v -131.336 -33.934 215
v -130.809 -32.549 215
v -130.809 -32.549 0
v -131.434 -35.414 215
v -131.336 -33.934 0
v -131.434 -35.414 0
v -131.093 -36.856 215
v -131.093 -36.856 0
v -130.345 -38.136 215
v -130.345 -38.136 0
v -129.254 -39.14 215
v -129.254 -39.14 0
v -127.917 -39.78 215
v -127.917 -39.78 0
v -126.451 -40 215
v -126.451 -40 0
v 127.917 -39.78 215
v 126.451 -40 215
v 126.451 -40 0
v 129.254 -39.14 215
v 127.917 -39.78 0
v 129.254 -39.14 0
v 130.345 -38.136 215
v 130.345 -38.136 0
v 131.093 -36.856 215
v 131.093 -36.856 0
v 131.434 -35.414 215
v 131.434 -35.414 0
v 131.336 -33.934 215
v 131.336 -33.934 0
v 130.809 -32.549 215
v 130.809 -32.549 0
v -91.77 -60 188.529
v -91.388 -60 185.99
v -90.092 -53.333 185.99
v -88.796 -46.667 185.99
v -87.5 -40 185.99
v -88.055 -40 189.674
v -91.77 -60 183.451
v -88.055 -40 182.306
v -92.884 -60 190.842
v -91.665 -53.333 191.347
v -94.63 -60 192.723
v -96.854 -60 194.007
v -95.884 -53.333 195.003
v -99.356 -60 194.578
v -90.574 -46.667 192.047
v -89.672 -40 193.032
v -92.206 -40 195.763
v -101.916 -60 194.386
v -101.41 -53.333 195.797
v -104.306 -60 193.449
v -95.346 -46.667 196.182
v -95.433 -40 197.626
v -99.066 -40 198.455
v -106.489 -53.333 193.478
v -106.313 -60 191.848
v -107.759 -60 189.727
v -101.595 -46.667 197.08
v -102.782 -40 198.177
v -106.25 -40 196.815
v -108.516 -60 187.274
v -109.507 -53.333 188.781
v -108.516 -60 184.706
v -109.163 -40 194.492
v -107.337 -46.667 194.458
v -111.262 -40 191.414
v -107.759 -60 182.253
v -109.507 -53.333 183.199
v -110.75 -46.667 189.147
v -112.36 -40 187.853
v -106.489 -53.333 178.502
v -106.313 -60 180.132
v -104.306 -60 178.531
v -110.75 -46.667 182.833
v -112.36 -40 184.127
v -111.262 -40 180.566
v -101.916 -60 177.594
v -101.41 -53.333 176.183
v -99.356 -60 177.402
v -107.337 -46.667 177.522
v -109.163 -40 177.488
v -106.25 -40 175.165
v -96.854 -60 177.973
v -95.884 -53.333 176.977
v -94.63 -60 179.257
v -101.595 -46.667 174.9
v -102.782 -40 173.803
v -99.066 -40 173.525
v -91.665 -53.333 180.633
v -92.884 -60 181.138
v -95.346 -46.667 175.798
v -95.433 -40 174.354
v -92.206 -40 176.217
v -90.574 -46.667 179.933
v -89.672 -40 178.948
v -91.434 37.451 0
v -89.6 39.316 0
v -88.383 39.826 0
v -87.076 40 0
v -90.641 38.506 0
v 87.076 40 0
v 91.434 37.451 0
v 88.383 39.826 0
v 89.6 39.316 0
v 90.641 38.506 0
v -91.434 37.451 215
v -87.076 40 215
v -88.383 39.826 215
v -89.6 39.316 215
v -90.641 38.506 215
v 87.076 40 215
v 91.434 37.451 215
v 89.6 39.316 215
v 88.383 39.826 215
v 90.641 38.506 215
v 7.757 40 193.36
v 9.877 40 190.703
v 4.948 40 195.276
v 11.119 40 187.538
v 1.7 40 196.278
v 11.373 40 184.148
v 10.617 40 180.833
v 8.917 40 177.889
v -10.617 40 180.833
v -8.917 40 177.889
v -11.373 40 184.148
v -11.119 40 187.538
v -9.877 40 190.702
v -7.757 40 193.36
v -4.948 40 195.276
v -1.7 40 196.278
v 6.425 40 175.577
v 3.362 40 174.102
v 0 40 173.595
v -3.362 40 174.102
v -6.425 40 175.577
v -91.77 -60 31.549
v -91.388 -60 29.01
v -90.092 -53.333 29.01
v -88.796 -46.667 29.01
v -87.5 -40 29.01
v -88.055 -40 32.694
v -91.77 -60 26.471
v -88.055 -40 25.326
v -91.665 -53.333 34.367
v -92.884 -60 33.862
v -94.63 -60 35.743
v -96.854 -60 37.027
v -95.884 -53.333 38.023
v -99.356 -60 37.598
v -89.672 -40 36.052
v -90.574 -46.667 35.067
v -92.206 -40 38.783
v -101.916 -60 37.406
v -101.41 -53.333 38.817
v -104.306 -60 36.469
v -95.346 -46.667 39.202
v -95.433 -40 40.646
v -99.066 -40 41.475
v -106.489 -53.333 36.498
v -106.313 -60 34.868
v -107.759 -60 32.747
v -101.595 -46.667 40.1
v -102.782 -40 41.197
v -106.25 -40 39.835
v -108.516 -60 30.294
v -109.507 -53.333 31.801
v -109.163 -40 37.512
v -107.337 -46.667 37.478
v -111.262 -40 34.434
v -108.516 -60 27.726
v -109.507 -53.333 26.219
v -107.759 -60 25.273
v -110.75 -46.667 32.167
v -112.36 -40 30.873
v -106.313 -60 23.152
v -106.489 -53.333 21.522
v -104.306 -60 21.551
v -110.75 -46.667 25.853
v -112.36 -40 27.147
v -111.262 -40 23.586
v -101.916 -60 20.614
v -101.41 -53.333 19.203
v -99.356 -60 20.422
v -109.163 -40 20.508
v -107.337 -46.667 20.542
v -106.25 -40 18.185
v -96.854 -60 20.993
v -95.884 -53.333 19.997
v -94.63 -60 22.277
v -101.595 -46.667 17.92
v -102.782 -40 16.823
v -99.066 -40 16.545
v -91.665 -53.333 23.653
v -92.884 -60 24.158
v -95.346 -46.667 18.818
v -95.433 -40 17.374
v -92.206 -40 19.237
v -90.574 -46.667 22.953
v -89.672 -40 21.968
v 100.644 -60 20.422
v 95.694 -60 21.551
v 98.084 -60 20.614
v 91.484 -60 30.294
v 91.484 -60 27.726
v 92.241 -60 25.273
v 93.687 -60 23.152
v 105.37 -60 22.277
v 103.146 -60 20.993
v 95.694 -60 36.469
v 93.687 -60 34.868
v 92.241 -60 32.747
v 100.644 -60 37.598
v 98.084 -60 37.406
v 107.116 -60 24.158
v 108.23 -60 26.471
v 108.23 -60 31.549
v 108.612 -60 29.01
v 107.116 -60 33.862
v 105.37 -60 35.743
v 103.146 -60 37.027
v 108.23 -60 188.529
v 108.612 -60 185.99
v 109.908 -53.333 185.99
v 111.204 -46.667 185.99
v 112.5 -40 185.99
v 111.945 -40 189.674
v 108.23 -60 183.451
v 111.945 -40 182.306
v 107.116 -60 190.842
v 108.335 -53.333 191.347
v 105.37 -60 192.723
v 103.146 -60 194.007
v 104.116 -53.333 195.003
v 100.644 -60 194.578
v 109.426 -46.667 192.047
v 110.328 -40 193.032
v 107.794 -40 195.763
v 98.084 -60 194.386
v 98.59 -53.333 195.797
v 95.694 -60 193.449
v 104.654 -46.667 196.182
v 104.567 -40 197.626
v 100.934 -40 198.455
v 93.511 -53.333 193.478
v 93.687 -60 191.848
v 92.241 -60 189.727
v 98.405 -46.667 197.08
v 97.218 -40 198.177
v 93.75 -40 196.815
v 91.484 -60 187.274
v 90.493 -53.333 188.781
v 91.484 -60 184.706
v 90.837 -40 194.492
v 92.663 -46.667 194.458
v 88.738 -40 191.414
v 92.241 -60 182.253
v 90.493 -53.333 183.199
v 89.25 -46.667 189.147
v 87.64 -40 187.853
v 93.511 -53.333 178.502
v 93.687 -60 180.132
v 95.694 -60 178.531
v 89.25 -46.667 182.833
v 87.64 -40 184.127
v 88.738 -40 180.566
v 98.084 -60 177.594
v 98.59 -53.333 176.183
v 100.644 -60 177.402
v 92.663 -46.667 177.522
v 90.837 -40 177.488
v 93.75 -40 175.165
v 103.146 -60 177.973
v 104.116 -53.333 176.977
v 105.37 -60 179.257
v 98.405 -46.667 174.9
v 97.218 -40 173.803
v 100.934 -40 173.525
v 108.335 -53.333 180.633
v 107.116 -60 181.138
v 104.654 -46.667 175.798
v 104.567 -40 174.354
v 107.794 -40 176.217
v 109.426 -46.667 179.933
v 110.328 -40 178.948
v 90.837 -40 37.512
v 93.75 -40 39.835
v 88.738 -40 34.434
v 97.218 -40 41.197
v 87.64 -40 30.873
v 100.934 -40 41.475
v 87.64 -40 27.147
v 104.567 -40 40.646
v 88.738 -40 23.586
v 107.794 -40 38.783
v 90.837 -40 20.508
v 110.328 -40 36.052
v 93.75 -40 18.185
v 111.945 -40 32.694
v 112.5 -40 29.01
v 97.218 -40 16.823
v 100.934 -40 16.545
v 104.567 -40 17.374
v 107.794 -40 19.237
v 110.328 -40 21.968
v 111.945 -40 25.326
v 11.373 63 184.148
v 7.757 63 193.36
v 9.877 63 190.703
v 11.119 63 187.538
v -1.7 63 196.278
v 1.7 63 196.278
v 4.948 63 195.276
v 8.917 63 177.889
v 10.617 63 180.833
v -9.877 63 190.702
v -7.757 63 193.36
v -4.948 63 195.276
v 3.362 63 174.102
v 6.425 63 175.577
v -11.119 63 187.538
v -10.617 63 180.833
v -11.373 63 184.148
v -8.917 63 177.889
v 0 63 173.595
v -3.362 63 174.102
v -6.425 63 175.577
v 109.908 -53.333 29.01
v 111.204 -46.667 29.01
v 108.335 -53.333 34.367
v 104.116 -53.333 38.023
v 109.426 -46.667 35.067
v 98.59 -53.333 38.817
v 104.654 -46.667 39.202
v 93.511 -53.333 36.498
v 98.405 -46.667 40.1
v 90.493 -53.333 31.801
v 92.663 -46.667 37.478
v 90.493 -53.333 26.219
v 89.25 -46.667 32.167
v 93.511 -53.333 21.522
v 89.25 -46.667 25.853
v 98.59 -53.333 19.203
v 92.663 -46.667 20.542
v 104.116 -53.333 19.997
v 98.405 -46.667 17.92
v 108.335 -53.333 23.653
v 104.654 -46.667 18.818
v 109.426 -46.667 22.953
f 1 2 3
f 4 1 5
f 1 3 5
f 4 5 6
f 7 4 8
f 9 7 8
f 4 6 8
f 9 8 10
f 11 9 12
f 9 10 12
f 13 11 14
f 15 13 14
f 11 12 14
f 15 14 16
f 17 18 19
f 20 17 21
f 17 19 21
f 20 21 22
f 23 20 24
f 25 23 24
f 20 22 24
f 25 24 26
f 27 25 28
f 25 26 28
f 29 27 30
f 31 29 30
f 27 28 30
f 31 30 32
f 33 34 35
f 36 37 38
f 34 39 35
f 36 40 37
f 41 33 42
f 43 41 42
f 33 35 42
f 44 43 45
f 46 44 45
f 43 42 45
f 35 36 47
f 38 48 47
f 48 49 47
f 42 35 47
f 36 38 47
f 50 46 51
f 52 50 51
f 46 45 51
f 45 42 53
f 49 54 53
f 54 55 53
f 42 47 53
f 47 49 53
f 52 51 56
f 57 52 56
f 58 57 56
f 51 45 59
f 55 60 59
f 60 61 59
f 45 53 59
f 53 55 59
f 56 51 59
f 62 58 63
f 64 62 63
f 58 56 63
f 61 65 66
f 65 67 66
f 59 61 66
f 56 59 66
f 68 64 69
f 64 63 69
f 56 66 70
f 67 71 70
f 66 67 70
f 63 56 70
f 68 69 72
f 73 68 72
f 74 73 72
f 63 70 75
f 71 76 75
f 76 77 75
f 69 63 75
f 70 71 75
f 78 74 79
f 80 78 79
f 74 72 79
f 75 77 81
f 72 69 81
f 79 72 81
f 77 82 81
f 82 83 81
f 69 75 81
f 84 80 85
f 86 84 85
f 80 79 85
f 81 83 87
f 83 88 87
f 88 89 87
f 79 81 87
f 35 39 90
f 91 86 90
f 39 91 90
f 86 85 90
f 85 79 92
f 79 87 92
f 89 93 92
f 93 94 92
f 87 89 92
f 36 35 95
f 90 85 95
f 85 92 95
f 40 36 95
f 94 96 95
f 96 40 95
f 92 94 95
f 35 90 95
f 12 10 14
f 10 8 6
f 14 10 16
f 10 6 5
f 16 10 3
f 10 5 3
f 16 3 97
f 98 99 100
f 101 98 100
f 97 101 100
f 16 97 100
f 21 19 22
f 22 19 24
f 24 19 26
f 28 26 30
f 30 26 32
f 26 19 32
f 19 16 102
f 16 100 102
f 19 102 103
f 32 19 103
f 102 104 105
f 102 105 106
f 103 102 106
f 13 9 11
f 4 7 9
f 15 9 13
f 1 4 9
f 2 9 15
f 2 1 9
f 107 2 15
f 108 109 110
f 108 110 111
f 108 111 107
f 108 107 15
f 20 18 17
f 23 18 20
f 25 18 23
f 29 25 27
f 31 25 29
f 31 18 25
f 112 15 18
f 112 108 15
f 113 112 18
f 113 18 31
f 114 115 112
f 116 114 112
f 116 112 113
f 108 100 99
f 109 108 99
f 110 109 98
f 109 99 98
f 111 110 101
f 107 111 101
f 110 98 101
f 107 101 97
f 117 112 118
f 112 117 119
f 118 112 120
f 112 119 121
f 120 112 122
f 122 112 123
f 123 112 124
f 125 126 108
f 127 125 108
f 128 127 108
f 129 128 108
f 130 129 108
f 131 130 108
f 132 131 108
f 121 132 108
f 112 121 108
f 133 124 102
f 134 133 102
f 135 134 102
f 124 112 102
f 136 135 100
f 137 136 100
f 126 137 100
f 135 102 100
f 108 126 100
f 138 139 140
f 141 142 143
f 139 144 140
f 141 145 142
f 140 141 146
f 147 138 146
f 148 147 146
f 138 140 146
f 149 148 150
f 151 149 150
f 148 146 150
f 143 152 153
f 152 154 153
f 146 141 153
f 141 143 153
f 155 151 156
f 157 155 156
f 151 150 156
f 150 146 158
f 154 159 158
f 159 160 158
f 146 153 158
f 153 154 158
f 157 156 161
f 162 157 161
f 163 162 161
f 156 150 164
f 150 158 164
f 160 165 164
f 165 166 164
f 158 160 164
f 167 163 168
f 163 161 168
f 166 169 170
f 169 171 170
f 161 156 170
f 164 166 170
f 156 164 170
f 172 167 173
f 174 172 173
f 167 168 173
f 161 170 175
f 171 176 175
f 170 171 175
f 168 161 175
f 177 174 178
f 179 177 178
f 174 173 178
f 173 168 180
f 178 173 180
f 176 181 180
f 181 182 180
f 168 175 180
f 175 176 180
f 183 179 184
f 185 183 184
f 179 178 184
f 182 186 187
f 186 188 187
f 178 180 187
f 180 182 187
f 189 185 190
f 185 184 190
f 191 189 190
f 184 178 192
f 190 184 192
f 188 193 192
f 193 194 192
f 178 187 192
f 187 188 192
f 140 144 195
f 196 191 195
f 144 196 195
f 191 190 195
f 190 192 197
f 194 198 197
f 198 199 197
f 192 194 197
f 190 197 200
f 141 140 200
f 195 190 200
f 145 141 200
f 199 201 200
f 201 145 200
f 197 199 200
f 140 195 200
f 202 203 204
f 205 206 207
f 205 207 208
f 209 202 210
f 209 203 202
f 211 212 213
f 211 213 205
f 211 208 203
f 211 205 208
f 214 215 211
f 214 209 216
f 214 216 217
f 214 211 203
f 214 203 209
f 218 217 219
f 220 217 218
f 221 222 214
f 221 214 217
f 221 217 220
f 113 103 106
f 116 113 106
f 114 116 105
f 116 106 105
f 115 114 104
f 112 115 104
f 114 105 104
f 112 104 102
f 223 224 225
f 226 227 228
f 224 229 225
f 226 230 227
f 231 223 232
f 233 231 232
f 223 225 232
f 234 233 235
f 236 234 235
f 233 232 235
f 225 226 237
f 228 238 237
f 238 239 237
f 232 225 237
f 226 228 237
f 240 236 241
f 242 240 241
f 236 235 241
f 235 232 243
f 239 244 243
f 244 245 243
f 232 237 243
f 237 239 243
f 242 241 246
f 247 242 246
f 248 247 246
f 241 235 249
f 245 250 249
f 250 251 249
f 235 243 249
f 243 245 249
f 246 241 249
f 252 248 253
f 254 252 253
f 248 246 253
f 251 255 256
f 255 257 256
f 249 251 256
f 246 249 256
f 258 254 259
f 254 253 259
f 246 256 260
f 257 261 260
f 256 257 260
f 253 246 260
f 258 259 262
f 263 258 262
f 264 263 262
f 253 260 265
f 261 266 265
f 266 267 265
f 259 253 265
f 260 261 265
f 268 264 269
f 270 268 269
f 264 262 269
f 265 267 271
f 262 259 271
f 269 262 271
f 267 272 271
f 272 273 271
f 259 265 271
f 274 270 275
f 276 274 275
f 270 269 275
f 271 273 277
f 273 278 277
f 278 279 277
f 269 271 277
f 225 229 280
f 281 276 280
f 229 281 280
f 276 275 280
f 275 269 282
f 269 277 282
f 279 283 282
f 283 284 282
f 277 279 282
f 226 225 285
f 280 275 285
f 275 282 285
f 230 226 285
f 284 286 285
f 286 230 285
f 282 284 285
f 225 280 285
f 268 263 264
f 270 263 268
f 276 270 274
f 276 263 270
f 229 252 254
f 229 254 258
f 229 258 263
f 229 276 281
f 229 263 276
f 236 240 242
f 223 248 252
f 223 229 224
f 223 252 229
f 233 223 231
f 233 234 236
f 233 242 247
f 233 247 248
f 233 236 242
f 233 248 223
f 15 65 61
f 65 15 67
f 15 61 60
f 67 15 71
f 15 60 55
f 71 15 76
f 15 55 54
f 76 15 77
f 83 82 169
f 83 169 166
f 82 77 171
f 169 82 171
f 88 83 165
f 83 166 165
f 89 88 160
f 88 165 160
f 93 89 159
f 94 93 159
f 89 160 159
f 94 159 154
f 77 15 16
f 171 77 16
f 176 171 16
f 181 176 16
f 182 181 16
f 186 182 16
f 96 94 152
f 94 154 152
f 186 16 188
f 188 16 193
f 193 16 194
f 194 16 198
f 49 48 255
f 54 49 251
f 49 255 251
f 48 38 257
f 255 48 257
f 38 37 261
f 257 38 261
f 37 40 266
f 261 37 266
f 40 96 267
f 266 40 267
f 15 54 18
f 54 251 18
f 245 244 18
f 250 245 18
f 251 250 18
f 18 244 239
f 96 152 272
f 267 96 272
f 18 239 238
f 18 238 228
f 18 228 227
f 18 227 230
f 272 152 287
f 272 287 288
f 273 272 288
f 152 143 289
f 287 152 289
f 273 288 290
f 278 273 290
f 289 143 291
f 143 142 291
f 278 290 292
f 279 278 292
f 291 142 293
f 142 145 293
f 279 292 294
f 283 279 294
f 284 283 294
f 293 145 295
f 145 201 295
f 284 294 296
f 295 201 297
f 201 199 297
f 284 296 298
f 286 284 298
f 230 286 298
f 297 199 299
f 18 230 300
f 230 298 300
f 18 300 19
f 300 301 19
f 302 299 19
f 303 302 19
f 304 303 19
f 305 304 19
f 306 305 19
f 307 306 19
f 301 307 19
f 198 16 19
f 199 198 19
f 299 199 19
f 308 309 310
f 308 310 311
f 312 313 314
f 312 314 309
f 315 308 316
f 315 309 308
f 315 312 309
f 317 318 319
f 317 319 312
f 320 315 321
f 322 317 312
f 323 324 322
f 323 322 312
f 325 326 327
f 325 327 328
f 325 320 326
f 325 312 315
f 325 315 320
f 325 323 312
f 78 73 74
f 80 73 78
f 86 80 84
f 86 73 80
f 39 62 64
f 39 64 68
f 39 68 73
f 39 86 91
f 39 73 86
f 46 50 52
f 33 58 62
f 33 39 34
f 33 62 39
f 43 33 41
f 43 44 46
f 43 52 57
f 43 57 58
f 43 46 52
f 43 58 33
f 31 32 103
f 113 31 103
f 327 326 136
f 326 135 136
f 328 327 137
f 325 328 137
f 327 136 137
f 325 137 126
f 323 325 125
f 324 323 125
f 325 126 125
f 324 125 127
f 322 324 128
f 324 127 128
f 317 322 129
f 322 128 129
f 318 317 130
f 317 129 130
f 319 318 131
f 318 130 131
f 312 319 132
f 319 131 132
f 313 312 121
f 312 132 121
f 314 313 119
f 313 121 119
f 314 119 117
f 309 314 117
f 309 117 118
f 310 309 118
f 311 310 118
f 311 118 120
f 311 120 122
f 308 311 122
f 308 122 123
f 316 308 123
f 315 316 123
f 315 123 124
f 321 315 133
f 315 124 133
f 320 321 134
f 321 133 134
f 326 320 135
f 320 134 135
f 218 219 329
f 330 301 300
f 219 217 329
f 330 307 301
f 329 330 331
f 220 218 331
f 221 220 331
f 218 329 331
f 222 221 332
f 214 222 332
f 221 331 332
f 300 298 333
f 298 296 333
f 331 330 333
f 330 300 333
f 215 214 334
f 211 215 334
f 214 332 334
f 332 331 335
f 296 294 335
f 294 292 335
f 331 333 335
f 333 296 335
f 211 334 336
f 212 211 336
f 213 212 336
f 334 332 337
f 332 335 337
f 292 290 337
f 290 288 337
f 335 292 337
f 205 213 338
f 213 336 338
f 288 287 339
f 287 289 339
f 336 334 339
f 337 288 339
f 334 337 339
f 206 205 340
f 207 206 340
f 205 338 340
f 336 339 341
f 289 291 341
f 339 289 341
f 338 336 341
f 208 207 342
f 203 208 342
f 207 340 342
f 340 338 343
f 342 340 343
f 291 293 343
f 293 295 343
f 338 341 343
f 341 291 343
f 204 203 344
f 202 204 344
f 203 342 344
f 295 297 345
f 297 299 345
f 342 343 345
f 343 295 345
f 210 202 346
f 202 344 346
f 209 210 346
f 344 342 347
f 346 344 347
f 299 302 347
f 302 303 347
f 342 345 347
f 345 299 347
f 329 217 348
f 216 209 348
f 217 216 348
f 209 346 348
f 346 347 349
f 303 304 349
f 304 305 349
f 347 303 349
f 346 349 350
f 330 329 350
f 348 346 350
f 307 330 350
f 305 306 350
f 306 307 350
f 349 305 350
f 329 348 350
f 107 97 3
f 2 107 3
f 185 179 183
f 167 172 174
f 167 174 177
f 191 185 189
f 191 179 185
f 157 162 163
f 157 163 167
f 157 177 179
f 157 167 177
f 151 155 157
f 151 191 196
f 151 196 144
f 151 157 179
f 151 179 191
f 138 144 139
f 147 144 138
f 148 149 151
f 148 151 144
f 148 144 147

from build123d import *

# Parameters (mm, degrees)
BOSS_EXTRUDE1_DEPTH           = 215
SKETCH2_R                     = 11.405
BOSS_EXTRUDE2_DEPTH           = 20
SKETCH4_R                     = 12.5
BOSS_EXTRUDE3_DEPTH           = 20
BOSS_EXTRUDE3_DRAFT           = 11
BOSS_EXTRUDE3_PROFILE_2_DEPTH = 20
BOSS_EXTRUDE3_PROFILE_2_DRAFT = 11
BOSS_EXTRUDE3_PROFILE_3_DEPTH = 20
BOSS_EXTRUDE3_PROFILE_3_DRAFT = 11
BOSS_EXTRUDE3_PROFILE_4_DEPTH = 20
BOSS_EXTRUDE3_PROFILE_4_DRAFT = 11
SKETCH5_R                     = 11.405
BOSS_EXTRUDE4_DEPTH           = 3


with BuildPart() as part:
    # Sketch1 → Boss-Extrude1 (new body)
    with BuildSketch(Plane.XY):
        with BuildLine():
            Line((-126.450762578, -40), (126.450762578, -40))
            ThreePointArc((126.450762578, -40), (130.766810017, -37.524229487), (130.808640264, -32.548693802))
            Line((130.808640264, -32.548693802), (91.433640264, 37.451306198))
            ThreePointArc((91.433640264, 37.451306198), (89.599992065, 39.316047439), (87.075762578, 40))
            Line((87.075762578, 40), (-87.075762578, 40))
            ThreePointArc((-87.075762578, 40), (-89.599992065, 39.316047439), (-91.433640264, 37.451306198))
            Line((-91.433640264, 37.451306198), (-130.808640264, -32.548693802))
            ThreePointArc((-130.808640264, -32.548693802), (-130.766810017, -37.524229487), (-126.450762578, -40))
        make_face()
    extrude(amount=BOSS_EXTRUDE1_DEPTH)

    # Sketch2 → Boss-Extrude2 (add)
    with BuildSketch(Plane(origin=(0, 40, 0), x_dir=(1, 0, 0), z_dir=(0, 1, 0))):
        with Locations(Location((0, -185, 0), (0, 0, 90))):
            Circle(SKETCH2_R)
    extrude(amount=BOSS_EXTRUDE2_DEPTH)


with BuildPart() as boss_extrude3_tool:
    # Sketch4 → Boss-Extrude3 (with draft: the straight prism first)
    with BuildSketch(Plane.XZ.offset(40)):
        with Locations((-100, 185.99)):
            Circle(SKETCH4_R)
    extrude(amount=BOSS_EXTRUDE3_DEPTH)
    # Boss-Extrude3: the draft: its side faces are tilted about the plane it starts from
    boss_extrude3_sides = [boss_extrude3_tool.faces().sort_by_distance(p)[0] for p in [
        (-112.5, -50, 185.99),
    ]]
    draft(boss_extrude3_sides, Plane.XZ.offset(40), BOSS_EXTRUDE3_DRAFT)


with BuildPart() as part_1:
    add(part.part)

    # Boss-Extrude3: add boss_extrude3_tool
    add(boss_extrude3_tool.part)


with BuildPart() as boss_extrude3_profile_2_tool:
    # Sketch4 → Boss-Extrude3 profile 2 (with draft: the straight prism first)
    with BuildSketch(Plane.XZ.offset(40)):
        with Locations((100, 185.99)):
            Circle(SKETCH4_R)
    extrude(amount=BOSS_EXTRUDE3_PROFILE_2_DEPTH)
    # Boss-Extrude3 profile 2: the draft: its side faces are tilted about the plane it starts from
    boss_extrude3_profile_2_sides = [boss_extrude3_profile_2_tool.faces().sort_by_distance(p)[0] for p in [
        (87.5, -50, 185.99),
    ]]
    draft(boss_extrude3_profile_2_sides, Plane.XZ.offset(40), BOSS_EXTRUDE3_PROFILE_2_DRAFT)


with BuildPart() as part_2:
    add(part_1.part)

    # Boss-Extrude3 profile 2: add boss_extrude3_profile_2_tool
    add(boss_extrude3_profile_2_tool.part)


with BuildPart() as boss_extrude3_profile_3_tool:
    # Sketch4 → Boss-Extrude3 profile 3 (with draft: the straight prism first)
    with BuildSketch(Plane.XZ.offset(40)):
        with Locations((100, 29.01)):
            Circle(SKETCH4_R)
    extrude(amount=BOSS_EXTRUDE3_PROFILE_3_DEPTH)
    # Boss-Extrude3 profile 3: the draft: its side faces are tilted about the plane it starts from
    boss_extrude3_profile_3_sides = [boss_extrude3_profile_3_tool.faces().sort_by_distance(p)[0] for p in [
        (87.5, -50, 29.01),
    ]]
    draft(boss_extrude3_profile_3_sides, Plane.XZ.offset(40), BOSS_EXTRUDE3_PROFILE_3_DRAFT)


with BuildPart() as part_3:
    add(part_2.part)

    # Boss-Extrude3 profile 3: add boss_extrude3_profile_3_tool
    add(boss_extrude3_profile_3_tool.part)


with BuildPart() as boss_extrude3_profile_4_tool:
    # Sketch4 → Boss-Extrude3 profile 4 (with draft: the straight prism first)
    with BuildSketch(Plane.XZ.offset(40)):
        with Locations((-100, 29.01)):
            Circle(SKETCH4_R)
    extrude(amount=BOSS_EXTRUDE3_PROFILE_4_DEPTH)
    # Boss-Extrude3 profile 4: the draft: its side faces are tilted about the plane it starts from
    boss_extrude3_profile_4_sides = [boss_extrude3_profile_4_tool.faces().sort_by_distance(p)[0] for p in [
        (-112.5, -50, 29.01),
    ]]
    draft(boss_extrude3_profile_4_sides, Plane.XZ.offset(40), BOSS_EXTRUDE3_PROFILE_4_DRAFT)


with BuildPart() as part_4:
    add(part_3.part)

    # Boss-Extrude3 profile 4: add boss_extrude3_profile_4_tool
    add(boss_extrude3_profile_4_tool.part)

    # Sketch5 → Boss-Extrude4 (add)
    with BuildSketch(Plane(origin=(0, 60, 0), x_dir=(1, 0, 0), z_dir=(0, 1, 0))):
        with Locations(Location((0, -185, 0), (0, 0, 90))):
            Circle(SKETCH5_R)
    extrude(amount=BOSS_EXTRUDE4_DEPTH)


solid = part_4.part
